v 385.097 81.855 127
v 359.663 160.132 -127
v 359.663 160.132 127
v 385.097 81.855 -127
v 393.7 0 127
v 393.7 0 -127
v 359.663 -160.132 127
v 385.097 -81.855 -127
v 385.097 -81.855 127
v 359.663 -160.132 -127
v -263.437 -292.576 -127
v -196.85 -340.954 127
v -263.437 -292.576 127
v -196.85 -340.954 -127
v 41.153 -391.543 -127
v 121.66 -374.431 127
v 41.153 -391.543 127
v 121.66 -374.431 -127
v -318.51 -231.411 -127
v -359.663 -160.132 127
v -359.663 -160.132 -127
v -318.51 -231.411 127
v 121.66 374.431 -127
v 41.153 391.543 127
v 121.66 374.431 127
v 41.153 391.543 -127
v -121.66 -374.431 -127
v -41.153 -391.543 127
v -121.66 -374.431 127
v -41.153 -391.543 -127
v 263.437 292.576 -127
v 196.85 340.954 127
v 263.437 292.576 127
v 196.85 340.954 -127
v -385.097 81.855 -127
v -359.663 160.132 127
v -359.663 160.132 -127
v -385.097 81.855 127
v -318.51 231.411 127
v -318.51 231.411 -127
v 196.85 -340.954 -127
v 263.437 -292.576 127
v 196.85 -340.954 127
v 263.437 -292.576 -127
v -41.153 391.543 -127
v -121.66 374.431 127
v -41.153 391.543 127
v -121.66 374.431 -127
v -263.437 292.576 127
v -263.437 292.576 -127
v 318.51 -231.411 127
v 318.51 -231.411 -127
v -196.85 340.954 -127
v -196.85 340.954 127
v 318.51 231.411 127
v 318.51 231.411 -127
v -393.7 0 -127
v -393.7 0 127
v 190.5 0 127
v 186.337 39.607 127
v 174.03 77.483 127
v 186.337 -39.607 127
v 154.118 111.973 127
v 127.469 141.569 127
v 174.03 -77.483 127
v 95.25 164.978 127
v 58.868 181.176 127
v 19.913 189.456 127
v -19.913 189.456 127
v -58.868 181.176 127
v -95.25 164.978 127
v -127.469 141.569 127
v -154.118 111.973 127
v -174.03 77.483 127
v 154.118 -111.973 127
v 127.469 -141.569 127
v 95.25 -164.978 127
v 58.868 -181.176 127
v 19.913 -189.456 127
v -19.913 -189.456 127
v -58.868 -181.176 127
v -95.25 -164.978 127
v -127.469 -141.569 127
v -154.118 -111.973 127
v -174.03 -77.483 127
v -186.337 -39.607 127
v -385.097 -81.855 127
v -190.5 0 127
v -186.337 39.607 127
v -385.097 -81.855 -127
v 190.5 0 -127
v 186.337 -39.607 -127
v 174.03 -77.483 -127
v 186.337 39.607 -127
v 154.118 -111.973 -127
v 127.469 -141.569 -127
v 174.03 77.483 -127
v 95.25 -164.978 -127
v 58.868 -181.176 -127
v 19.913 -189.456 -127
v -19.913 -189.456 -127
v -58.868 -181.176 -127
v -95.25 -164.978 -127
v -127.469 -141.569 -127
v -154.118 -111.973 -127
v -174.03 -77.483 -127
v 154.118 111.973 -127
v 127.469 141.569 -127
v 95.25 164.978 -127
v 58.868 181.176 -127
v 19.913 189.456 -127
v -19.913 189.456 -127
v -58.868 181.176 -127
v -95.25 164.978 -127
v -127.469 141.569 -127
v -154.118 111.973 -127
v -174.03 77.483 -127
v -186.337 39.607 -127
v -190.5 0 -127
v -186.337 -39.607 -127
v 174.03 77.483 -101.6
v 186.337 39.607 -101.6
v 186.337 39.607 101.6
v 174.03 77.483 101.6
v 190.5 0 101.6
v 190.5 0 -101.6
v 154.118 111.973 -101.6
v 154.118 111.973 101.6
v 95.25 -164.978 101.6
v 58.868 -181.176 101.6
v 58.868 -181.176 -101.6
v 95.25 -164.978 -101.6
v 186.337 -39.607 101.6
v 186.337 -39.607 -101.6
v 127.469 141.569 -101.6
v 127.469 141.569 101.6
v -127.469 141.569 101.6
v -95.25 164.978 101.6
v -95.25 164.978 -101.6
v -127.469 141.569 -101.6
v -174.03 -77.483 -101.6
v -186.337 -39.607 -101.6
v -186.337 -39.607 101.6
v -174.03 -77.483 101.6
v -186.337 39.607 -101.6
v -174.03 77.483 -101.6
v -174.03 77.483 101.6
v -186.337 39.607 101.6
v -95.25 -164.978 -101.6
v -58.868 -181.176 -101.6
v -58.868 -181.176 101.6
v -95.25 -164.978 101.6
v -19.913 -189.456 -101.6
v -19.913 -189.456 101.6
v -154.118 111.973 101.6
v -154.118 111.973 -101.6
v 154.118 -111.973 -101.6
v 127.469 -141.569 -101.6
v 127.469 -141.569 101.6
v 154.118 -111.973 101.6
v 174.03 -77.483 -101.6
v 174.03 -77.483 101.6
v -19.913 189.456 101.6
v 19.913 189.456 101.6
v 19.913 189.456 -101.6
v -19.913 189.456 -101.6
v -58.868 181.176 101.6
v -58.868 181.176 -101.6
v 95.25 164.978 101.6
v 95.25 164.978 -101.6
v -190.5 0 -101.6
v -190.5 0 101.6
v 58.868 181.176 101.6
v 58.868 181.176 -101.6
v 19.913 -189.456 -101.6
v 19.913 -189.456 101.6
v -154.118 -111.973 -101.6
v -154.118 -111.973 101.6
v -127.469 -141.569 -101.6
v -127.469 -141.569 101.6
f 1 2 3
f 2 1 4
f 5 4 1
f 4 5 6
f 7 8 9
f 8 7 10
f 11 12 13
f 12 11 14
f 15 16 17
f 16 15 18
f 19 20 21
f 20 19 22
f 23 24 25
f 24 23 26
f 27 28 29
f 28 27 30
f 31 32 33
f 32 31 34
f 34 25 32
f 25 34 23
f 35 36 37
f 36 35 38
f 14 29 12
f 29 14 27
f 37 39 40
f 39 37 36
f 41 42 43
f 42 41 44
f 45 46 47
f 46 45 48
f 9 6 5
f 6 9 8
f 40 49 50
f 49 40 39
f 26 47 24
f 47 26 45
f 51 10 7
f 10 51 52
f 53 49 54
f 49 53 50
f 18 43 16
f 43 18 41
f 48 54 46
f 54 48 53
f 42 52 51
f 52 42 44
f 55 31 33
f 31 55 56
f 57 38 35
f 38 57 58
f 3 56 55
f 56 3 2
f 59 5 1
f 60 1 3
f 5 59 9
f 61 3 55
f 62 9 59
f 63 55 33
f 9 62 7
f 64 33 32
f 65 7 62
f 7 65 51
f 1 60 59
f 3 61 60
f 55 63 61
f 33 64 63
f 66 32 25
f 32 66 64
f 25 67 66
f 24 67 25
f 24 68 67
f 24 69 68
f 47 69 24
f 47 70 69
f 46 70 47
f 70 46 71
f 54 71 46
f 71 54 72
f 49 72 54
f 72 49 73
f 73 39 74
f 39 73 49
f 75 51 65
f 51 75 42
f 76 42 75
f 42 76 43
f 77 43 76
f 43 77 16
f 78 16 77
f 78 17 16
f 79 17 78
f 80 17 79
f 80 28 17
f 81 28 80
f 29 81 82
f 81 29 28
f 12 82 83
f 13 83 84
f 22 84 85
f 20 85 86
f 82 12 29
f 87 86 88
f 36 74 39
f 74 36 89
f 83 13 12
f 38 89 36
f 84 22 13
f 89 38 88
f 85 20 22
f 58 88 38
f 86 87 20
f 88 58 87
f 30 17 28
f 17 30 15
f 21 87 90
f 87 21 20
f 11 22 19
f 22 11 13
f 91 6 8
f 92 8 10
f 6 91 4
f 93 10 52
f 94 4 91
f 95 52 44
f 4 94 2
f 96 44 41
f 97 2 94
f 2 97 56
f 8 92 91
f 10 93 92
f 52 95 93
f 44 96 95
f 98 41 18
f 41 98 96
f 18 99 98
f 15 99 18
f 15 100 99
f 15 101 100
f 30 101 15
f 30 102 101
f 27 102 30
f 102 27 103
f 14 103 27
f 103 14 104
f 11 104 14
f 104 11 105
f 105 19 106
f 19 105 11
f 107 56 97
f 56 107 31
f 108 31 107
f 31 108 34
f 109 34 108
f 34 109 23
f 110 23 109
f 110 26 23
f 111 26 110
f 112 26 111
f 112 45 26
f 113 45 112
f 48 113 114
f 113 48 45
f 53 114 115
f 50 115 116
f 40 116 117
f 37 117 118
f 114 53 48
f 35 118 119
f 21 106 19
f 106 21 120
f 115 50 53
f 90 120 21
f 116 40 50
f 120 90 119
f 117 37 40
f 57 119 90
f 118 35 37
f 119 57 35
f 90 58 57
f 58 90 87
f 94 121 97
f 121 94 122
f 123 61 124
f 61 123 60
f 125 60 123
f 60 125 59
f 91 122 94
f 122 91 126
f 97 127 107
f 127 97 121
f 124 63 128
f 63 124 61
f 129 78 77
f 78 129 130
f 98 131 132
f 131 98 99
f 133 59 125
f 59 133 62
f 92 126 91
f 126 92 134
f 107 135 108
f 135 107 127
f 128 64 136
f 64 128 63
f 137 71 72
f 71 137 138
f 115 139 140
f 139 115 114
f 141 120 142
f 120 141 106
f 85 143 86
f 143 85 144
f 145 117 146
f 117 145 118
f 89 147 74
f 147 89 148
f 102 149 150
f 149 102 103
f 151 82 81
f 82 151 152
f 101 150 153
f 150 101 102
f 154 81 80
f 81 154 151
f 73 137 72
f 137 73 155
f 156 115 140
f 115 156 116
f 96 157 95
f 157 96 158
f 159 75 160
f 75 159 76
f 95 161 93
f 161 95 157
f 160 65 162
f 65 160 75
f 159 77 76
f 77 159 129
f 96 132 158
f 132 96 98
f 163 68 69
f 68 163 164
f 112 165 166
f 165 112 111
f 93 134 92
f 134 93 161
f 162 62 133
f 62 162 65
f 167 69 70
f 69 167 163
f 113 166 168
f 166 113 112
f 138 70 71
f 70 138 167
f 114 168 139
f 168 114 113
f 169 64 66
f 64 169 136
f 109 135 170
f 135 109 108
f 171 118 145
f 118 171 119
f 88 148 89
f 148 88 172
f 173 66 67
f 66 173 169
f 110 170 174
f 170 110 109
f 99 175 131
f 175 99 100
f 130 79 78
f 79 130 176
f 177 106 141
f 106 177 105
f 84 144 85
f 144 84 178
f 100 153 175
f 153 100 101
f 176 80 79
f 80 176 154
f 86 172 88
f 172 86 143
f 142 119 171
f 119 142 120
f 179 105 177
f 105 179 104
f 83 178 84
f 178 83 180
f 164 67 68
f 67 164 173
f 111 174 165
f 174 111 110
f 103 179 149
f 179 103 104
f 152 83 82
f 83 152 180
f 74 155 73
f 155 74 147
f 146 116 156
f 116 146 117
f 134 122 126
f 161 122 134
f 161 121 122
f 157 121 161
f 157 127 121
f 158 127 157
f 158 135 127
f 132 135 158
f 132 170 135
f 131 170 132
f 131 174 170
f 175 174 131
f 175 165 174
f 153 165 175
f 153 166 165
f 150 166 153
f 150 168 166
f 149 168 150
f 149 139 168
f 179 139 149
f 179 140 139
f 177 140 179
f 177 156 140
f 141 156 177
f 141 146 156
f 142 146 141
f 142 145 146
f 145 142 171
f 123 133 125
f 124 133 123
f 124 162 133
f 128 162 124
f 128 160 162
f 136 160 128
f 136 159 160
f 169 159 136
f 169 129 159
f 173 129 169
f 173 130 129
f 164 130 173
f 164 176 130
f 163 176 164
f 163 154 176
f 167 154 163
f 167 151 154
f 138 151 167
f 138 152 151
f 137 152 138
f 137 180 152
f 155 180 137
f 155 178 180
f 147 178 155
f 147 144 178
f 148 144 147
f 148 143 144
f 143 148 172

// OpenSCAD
// file: ../lib/colors.scad
module color_wood() {
  color("#f2ba52")
    children();
}

module color_hdpe() {
  color("#ccd")
    children();
}

module color_steel() {
  color("#888")
    children();
}

module color_white() {
  color("#fafafa")
    children();
}

module color_black() {
  color("#333")
    children();
}
// file: ../lib/convert.scad
function inches(in) = in * 25.4;
function feet(ft) = inches(ft * 12);
// main file
use <../lib/convert.scad>
use <../lib/colors.scad>

module wheel() {
  color_black()
  difference() {
      cylinder(h = inches(10), d = inches(31), center = true);
      cylinder(h = inches(13), d = inches(15), center = true);
  }
  color_steel()
    cylinder(h = inches(8), d = inches(15), center = true);
}

wheel();
